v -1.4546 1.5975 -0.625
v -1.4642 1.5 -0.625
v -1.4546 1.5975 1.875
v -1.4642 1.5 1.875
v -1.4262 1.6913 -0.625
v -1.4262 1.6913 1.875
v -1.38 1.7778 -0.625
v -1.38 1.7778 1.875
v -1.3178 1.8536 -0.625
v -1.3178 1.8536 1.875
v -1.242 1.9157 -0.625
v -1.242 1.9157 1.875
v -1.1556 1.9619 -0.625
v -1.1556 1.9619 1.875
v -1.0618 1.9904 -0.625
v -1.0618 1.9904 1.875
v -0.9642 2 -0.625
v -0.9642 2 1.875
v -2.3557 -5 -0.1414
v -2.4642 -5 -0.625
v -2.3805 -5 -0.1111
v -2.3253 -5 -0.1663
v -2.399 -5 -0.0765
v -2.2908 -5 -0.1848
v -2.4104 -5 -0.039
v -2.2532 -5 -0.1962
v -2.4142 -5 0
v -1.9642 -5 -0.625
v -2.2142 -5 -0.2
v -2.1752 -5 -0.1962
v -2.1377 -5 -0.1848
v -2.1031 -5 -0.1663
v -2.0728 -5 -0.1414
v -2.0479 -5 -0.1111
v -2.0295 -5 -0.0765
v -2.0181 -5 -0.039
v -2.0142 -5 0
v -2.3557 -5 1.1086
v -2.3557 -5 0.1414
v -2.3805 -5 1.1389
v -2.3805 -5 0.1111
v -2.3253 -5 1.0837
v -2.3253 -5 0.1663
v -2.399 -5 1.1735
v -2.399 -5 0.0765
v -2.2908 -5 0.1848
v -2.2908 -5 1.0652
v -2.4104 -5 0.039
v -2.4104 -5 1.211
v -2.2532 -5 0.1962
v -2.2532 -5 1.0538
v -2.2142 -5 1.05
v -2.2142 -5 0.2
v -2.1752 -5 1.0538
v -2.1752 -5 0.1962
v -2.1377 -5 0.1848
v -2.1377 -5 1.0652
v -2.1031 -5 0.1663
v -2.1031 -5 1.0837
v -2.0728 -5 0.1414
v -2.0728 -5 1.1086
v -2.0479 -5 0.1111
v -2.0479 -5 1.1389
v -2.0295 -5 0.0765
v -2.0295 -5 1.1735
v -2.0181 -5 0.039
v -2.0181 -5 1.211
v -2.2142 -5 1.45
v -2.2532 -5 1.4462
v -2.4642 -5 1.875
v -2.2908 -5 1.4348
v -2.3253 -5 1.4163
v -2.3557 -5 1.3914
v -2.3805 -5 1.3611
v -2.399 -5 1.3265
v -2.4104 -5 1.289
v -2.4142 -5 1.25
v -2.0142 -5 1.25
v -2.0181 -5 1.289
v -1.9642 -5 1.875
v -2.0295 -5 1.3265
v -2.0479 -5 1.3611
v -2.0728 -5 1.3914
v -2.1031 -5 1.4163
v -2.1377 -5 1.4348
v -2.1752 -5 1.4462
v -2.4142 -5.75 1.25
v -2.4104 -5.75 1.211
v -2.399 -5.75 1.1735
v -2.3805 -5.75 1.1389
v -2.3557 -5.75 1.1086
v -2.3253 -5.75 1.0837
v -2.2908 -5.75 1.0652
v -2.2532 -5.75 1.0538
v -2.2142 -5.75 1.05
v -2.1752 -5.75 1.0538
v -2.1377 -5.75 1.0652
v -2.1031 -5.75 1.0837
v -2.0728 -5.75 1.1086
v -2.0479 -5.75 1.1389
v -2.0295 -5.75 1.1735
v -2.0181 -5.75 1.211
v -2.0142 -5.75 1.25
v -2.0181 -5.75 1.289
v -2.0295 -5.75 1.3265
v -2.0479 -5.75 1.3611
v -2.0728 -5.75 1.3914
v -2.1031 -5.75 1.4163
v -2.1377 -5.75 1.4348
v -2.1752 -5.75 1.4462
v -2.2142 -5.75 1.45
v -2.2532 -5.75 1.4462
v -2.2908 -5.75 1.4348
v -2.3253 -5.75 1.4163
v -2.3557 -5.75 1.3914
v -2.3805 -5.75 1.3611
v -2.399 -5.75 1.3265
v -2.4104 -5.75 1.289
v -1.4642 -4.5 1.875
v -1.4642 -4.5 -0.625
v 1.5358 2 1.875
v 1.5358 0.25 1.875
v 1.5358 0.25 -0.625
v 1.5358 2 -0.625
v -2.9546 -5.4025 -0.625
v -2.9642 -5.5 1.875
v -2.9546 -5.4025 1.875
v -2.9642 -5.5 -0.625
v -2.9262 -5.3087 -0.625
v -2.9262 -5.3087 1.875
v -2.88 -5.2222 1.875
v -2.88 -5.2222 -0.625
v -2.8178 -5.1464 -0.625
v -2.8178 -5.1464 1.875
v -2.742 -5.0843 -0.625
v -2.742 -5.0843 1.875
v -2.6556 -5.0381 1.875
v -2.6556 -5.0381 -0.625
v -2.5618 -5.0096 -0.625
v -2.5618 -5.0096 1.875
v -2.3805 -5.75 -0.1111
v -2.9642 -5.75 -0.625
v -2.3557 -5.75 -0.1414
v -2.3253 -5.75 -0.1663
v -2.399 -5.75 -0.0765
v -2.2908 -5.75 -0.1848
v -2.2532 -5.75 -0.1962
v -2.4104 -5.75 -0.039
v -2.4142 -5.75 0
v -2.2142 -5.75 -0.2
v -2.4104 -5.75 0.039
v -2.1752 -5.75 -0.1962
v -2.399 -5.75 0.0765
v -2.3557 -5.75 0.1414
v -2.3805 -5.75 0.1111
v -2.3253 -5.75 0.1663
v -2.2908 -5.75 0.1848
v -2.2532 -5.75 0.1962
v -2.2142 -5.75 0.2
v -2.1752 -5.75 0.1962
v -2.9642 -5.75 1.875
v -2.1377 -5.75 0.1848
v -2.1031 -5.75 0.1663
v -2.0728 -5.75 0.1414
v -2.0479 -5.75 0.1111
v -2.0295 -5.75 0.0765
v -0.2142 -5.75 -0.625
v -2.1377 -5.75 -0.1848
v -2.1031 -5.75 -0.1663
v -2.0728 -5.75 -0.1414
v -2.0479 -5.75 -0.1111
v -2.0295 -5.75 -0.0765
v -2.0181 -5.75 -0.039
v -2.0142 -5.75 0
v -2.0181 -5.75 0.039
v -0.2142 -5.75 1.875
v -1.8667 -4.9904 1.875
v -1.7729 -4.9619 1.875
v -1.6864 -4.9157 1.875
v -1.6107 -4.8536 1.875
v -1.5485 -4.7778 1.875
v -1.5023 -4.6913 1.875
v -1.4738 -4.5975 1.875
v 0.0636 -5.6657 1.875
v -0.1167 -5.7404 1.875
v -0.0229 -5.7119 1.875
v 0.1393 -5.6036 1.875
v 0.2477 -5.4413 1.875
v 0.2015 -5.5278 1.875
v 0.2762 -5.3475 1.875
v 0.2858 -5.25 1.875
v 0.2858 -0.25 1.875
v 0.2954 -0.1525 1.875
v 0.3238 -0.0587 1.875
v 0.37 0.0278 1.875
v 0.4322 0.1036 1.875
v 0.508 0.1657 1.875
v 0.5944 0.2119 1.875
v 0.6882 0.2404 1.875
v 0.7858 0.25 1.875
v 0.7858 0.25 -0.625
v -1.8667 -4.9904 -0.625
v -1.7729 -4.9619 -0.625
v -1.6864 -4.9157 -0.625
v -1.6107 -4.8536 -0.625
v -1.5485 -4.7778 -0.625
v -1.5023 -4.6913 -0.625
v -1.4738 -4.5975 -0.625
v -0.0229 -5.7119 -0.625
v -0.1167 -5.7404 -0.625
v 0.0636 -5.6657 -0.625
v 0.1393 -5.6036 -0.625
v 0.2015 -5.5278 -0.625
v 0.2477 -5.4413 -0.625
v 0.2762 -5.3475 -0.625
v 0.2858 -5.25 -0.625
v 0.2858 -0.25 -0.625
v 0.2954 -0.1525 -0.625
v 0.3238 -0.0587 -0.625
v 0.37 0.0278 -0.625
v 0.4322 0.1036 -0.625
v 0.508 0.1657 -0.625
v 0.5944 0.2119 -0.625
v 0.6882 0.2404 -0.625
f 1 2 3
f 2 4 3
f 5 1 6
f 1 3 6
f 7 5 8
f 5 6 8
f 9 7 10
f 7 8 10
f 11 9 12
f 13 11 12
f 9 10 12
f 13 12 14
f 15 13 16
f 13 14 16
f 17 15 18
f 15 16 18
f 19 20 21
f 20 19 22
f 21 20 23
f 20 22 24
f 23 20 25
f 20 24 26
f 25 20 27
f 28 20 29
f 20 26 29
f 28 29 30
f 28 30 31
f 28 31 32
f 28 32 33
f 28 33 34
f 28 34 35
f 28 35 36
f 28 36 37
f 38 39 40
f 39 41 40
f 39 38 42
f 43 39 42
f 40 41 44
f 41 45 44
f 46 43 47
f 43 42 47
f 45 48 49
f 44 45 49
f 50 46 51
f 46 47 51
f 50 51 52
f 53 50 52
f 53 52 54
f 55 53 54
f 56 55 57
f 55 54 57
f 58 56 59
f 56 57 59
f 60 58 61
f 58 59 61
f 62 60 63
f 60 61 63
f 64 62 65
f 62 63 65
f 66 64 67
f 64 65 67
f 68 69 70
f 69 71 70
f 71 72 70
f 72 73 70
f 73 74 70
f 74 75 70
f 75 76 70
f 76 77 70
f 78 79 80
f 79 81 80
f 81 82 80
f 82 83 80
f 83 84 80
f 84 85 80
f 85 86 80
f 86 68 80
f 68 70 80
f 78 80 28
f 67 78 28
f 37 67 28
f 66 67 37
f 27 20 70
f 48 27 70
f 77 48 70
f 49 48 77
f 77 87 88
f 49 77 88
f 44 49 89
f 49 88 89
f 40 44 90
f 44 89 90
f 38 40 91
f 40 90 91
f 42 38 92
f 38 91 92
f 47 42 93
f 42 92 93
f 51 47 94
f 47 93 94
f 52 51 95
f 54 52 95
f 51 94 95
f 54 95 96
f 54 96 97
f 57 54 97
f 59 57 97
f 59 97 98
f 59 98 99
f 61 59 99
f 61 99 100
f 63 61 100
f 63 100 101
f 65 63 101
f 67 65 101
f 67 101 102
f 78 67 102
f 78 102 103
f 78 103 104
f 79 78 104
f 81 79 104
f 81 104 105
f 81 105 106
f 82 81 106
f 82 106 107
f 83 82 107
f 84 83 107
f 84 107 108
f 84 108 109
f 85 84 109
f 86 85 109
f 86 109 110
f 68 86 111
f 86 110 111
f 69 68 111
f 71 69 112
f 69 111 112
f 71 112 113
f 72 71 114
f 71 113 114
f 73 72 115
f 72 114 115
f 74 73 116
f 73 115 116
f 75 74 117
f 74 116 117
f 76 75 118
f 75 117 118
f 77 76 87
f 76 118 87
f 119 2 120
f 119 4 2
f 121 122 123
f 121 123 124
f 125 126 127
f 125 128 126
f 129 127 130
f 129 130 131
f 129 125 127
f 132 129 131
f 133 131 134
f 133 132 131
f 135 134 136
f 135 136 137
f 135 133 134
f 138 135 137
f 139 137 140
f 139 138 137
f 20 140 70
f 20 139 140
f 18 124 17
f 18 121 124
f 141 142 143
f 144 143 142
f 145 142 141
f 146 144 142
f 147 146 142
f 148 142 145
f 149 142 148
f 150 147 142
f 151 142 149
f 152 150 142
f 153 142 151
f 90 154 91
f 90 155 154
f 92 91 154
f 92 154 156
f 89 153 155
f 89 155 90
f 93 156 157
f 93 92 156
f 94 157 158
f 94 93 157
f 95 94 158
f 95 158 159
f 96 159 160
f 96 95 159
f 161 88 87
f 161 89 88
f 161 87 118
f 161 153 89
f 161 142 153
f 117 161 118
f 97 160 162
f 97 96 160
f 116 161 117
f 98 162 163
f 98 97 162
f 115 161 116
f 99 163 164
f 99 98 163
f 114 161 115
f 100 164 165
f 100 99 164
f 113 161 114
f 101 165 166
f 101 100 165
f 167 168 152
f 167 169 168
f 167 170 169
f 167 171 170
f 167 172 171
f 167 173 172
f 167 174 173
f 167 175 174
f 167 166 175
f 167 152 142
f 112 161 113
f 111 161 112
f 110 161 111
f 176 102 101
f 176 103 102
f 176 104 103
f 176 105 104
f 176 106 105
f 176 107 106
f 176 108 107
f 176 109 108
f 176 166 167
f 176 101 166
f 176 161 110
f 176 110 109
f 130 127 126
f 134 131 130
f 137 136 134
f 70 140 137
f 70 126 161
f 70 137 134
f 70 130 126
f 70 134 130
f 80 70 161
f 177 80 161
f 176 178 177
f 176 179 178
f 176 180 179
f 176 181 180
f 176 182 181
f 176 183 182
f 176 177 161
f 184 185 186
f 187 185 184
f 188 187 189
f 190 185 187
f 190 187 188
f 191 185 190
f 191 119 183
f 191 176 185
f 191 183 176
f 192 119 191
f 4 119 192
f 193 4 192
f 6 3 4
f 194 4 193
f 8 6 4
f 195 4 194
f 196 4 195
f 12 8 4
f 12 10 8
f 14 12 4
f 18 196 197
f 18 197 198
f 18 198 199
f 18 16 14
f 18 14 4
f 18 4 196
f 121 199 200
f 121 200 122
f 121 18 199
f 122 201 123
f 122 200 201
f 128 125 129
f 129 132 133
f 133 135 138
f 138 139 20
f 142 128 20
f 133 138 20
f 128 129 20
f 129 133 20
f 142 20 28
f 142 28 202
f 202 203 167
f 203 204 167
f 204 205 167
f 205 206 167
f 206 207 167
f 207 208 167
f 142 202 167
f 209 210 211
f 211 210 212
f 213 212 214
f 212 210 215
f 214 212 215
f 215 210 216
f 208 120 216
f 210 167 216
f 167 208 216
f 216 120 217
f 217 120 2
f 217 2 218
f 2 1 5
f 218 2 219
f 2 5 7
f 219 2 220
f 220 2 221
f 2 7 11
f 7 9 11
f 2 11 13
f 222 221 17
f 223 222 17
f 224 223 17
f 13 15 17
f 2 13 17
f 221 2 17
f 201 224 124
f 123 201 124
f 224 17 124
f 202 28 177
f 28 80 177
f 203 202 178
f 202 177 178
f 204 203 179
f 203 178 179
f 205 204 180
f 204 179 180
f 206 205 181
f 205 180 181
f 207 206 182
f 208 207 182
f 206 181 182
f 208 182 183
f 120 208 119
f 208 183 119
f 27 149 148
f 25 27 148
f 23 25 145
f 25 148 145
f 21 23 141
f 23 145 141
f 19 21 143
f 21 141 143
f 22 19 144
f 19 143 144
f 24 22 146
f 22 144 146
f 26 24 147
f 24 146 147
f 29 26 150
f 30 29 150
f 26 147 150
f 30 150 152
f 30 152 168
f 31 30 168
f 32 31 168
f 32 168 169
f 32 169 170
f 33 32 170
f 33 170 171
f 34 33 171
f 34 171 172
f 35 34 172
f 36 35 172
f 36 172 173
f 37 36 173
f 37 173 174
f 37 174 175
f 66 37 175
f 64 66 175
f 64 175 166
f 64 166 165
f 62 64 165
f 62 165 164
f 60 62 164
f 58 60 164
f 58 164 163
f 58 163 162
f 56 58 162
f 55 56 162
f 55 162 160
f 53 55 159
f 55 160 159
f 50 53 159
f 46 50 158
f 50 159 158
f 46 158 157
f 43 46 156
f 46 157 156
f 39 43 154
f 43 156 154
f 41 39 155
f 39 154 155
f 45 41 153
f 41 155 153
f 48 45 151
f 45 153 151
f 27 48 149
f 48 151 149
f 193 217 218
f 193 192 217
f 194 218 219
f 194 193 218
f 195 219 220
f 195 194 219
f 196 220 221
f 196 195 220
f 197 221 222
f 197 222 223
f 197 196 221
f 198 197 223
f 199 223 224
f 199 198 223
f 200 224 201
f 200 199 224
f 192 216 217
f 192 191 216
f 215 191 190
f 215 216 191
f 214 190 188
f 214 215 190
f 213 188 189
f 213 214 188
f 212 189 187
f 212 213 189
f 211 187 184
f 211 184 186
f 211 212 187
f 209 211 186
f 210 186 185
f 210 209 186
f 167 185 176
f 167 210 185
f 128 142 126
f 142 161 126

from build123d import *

# Parameters (mm, degrees)
SKETCH1_W                  = 1.5
SKETCH1_H                  = 0.75
BOSS_EXTRUDE1_DEPTH        = 1.875
BOSS_EXTRUDE1_DEPTH_BACK   = 0.625
FILLET1_R                  = 0.5
F_0_4_0_4_DIAMETER_HOLE1_D = 0.4


with BuildPart() as part:
    # Sketch1 → Boss-Extrude1 (new body, two sides)
    with BuildSketch(Plane.XY) as boss_extrude1_sk:
        Polygon((0.285769435, 0.25), (-1.464230565, 0.25), (-1.464230565, -5), (-1.464230565, -5.75), (0.285769435, -5.75), align=None)
        Polygon((-1.464230565, 2), (-1.464230565, 0.25), (0.285769435, 0.25), (1.535769435, 0.25), (1.535769435, 2), align=None)
        with Locations((-2.214230565, -5.375)):
            Rectangle(SKETCH1_W, SKETCH1_H)
    extrude(amount=BOSS_EXTRUDE1_DEPTH)
    extrude(boss_extrude1_sk.sketch, amount=-BOSS_EXTRUDE1_DEPTH_BACK)

    # Fillet1
    fillet1_edges = [part.edges().sort_by_distance(p)[0] for p in [
        (0.285769435, 0.25, 0.625),
        (-2.964230565, -5, 0.625),
        (-1.464230565, -5, 0.625),
        (0.285769435, -5.75, 0.625),
        (-1.464230565, 2, 0.625),
    ]]
    fillet(fillet1_edges, radius=FILLET1_R)

    # Ø0.4 (0.4) Diameter Hole1 (through all)
    with Locations(Plane(origin=(0, -5, 0), x_dir=(1, 0, 0), z_dir=(0, 1, 0))):
        with Locations((-2.214230565, 0), (-2.214230565, -1.25)):
            Hole(F_0_4_0_4_DIAMETER_HOLE1_D / 2)


solid = part.part
